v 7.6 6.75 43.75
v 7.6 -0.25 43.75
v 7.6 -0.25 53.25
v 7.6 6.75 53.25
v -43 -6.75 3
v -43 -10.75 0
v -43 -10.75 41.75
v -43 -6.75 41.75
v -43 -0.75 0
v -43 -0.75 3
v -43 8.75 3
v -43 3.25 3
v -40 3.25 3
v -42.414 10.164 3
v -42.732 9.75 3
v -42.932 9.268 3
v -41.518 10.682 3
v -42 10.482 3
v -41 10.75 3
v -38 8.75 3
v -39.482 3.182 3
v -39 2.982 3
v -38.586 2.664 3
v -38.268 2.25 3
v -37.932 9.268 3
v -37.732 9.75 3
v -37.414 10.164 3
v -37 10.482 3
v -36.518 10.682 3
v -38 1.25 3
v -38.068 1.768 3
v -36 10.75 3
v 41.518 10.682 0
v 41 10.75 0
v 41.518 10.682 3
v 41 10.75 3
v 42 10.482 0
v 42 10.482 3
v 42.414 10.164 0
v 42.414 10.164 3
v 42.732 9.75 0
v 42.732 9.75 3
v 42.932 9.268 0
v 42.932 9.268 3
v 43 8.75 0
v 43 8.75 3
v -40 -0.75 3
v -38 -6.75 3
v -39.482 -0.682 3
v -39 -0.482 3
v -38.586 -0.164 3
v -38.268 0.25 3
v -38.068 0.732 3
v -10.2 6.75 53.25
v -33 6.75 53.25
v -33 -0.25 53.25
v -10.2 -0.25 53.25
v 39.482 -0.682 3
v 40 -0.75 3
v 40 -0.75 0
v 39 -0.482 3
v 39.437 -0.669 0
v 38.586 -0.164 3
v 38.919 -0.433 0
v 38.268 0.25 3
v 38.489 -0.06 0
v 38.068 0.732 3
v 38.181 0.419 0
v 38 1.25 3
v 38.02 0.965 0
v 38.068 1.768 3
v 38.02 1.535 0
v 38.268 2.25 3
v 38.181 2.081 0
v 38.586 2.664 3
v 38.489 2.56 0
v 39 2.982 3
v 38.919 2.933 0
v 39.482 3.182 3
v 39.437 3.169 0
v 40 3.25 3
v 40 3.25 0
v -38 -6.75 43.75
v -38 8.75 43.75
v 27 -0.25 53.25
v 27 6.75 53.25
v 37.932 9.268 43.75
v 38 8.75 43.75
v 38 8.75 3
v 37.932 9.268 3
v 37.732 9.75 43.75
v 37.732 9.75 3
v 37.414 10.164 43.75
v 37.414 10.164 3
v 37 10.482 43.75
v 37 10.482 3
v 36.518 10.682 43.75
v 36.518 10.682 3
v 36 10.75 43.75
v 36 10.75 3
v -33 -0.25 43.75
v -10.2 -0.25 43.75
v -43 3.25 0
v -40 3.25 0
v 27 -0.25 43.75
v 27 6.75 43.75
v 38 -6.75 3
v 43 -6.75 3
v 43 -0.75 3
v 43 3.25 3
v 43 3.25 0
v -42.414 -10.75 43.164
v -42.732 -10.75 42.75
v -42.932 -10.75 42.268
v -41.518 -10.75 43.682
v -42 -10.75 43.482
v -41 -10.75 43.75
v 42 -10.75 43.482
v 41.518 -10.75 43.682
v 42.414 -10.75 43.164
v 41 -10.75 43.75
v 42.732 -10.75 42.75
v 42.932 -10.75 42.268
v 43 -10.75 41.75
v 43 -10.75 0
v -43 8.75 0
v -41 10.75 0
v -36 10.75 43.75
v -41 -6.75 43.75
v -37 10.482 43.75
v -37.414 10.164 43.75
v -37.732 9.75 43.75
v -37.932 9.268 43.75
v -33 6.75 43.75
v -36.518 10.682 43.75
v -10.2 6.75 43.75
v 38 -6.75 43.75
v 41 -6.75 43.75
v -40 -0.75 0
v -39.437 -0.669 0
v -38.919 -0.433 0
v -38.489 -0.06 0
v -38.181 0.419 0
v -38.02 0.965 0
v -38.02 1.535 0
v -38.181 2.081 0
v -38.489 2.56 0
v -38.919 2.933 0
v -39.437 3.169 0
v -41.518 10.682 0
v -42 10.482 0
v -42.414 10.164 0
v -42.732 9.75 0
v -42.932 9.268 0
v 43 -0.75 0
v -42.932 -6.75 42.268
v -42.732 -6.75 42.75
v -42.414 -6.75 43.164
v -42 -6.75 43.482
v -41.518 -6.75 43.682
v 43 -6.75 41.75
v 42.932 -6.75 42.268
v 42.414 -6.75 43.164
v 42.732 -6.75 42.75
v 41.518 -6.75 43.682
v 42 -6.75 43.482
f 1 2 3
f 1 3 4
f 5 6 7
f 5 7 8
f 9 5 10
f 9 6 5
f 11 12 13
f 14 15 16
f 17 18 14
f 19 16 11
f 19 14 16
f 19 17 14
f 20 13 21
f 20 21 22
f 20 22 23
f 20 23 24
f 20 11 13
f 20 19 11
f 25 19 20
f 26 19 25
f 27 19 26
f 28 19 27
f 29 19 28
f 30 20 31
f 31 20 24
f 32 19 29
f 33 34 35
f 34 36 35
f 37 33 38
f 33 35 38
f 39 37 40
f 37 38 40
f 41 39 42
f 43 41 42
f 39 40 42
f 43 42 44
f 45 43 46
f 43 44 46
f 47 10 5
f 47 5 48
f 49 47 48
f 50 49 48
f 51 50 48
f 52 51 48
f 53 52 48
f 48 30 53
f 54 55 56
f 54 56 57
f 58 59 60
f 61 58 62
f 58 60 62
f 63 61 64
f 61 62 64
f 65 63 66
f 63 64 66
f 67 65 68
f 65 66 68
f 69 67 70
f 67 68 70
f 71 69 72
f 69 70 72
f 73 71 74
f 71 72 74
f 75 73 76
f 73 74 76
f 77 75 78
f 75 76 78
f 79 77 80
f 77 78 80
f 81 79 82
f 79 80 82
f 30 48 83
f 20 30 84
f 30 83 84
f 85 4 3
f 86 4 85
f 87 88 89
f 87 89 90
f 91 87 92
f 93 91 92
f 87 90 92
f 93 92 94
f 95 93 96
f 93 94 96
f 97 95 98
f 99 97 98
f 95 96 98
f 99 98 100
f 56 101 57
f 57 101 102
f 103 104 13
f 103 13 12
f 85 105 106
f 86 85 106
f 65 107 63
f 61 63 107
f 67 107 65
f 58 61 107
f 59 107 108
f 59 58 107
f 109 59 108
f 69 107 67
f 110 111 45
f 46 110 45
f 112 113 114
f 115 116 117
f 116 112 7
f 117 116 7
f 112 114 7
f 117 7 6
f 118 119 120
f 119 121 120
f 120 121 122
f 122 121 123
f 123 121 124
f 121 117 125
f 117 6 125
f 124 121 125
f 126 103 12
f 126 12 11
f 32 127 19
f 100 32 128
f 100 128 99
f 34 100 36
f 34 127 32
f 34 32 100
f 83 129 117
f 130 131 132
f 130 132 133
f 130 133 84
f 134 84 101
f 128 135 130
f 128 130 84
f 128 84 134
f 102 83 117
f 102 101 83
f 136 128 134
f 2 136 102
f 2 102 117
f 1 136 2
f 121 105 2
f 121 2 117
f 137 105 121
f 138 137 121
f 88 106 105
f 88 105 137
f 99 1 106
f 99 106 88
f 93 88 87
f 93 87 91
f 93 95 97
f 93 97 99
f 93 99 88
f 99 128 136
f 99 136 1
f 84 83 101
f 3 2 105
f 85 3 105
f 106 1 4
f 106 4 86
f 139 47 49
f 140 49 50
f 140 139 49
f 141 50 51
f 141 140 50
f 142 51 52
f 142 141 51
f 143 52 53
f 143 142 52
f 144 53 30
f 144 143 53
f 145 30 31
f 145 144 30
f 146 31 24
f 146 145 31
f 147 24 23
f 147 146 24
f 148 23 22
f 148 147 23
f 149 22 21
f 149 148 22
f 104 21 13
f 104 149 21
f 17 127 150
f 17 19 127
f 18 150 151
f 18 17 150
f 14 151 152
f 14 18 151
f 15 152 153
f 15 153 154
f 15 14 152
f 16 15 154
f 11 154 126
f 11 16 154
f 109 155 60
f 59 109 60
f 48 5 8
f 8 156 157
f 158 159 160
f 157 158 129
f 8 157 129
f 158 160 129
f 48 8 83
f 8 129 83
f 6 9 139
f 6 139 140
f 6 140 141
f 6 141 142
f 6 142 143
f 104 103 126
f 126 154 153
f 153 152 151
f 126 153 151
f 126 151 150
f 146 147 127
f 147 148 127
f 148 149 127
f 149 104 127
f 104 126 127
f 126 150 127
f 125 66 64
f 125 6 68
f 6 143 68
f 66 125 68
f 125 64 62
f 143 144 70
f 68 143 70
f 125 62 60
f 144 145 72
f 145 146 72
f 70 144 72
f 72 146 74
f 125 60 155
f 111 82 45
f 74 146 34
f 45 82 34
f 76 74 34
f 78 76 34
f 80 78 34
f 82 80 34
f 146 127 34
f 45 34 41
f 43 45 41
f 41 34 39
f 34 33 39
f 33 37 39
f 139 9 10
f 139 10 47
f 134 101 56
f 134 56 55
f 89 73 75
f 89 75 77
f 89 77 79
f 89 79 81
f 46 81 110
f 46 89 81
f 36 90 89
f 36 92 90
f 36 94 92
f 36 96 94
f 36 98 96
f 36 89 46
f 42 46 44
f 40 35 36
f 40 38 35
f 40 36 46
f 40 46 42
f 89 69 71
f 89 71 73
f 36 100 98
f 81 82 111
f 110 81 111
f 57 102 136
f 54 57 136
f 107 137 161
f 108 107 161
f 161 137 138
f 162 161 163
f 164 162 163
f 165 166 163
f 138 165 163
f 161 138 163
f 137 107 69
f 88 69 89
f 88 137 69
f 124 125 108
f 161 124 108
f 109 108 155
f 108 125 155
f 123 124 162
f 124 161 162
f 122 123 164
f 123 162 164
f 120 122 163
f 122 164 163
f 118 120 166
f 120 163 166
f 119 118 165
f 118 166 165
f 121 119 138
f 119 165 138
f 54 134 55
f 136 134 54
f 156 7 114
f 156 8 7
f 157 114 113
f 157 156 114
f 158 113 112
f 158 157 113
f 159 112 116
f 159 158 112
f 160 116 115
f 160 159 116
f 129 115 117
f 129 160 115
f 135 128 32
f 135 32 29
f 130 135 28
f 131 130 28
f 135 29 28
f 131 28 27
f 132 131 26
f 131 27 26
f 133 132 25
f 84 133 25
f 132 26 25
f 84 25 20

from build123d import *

# Parameters (mm, degrees)
SKETCH1_W           = 86
SKETCH1_H           = 21.5
BOSS_EXTRUDE1_DEPTH = 43.75
SKETCH2_W           = 5
SKETCH2_H           = 17.5
CUT_EXTRUDE1_DEPTH  = 40.75
CUT_EXTRUDE2_DEPTH  = 63.278607884
FILLET1_R           = 2
SKETCH4_W           = 22.8
SKETCH4_H           = 7
SKETCH4_W_2         = 19.4
BOSS_EXTRUDE2_DEPTH = 9.5


with BuildPart() as part:
    # Sketch1 → Boss-Extrude1 (new body)
    with BuildSketch(Plane.XY):
        Rectangle(SKETCH1_W, SKETCH1_H)
    extrude(amount=BOSS_EXTRUDE1_DEPTH)

    # Sketch2 → Cut-Extrude1 (cut)
    with BuildSketch(Plane.XY.offset(43.75)):
        with Locations((-40.5, 2)):
            Rectangle(SKETCH2_W, SKETCH2_H)
        with Locations((40.5, 2)):
            Rectangle(SKETCH2_W, SKETCH2_H)
    extrude(amount=-CUT_EXTRUDE1_DEPTH, mode=Mode.SUBTRACT)

    # Sketch3 → Cut-Extrude2 (cut, through all)
    with BuildSketch(Plane(origin=(0, 0, 0), x_dir=(-1, 0, 0), z_dir=(0, 0, -1))):
        with BuildLine():
            Line((40, 3.25), (47.671145092, 3.25))
            ThreePointArc((47.671145092, 3.25), (49.671145092, 1.25), (47.671145092, -0.75))
            Line((47.671145092, -0.75), (40, -0.75))
            ThreePointArc((40, -0.75), (38, 1.25), (40, 3.25))
        make_face()
        with BuildLine():
            Line((-40, 3.25), (-47.671145092, 3.25))
            ThreePointArc((-47.671145092, 3.25), (-49.671145092, 1.25), (-47.671145092, -0.75))
            Line((-47.671145092, -0.75), (-40, -0.75))
            ThreePointArc((-40, -0.75), (-38, 1.25), (-40, 3.25))
        make_face()
    extrude(amount=-CUT_EXTRUDE2_DEPTH, mode=Mode.SUBTRACT)

    # Fillet1
    fillet1_edges = [part.edges().sort_by_distance(p)[0] for p in [
        (-43, -8.75, 43.75),
        (-43, 10.75, 1.5),
        (43, 10.75, 1.5),
        (-38, 10.75, 23.375),
        (38, 10.75, 23.375),
        (43, -8.75, 43.75),
    ]]
    fillet(fillet1_edges, radius=FILLET1_R)

    # Sketch4 → Boss-Extrude2 (add)
    with BuildSketch(Plane.XY.offset(43.75)):
        with Locations((-21.6, 3.25)):
            Rectangle(SKETCH4_W, SKETCH4_H)
        with Locations((17.3, 3.25)):
            Rectangle(SKETCH4_W_2, SKETCH4_H)
    extrude(amount=BOSS_EXTRUDE2_DEPTH)


solid = part.part
